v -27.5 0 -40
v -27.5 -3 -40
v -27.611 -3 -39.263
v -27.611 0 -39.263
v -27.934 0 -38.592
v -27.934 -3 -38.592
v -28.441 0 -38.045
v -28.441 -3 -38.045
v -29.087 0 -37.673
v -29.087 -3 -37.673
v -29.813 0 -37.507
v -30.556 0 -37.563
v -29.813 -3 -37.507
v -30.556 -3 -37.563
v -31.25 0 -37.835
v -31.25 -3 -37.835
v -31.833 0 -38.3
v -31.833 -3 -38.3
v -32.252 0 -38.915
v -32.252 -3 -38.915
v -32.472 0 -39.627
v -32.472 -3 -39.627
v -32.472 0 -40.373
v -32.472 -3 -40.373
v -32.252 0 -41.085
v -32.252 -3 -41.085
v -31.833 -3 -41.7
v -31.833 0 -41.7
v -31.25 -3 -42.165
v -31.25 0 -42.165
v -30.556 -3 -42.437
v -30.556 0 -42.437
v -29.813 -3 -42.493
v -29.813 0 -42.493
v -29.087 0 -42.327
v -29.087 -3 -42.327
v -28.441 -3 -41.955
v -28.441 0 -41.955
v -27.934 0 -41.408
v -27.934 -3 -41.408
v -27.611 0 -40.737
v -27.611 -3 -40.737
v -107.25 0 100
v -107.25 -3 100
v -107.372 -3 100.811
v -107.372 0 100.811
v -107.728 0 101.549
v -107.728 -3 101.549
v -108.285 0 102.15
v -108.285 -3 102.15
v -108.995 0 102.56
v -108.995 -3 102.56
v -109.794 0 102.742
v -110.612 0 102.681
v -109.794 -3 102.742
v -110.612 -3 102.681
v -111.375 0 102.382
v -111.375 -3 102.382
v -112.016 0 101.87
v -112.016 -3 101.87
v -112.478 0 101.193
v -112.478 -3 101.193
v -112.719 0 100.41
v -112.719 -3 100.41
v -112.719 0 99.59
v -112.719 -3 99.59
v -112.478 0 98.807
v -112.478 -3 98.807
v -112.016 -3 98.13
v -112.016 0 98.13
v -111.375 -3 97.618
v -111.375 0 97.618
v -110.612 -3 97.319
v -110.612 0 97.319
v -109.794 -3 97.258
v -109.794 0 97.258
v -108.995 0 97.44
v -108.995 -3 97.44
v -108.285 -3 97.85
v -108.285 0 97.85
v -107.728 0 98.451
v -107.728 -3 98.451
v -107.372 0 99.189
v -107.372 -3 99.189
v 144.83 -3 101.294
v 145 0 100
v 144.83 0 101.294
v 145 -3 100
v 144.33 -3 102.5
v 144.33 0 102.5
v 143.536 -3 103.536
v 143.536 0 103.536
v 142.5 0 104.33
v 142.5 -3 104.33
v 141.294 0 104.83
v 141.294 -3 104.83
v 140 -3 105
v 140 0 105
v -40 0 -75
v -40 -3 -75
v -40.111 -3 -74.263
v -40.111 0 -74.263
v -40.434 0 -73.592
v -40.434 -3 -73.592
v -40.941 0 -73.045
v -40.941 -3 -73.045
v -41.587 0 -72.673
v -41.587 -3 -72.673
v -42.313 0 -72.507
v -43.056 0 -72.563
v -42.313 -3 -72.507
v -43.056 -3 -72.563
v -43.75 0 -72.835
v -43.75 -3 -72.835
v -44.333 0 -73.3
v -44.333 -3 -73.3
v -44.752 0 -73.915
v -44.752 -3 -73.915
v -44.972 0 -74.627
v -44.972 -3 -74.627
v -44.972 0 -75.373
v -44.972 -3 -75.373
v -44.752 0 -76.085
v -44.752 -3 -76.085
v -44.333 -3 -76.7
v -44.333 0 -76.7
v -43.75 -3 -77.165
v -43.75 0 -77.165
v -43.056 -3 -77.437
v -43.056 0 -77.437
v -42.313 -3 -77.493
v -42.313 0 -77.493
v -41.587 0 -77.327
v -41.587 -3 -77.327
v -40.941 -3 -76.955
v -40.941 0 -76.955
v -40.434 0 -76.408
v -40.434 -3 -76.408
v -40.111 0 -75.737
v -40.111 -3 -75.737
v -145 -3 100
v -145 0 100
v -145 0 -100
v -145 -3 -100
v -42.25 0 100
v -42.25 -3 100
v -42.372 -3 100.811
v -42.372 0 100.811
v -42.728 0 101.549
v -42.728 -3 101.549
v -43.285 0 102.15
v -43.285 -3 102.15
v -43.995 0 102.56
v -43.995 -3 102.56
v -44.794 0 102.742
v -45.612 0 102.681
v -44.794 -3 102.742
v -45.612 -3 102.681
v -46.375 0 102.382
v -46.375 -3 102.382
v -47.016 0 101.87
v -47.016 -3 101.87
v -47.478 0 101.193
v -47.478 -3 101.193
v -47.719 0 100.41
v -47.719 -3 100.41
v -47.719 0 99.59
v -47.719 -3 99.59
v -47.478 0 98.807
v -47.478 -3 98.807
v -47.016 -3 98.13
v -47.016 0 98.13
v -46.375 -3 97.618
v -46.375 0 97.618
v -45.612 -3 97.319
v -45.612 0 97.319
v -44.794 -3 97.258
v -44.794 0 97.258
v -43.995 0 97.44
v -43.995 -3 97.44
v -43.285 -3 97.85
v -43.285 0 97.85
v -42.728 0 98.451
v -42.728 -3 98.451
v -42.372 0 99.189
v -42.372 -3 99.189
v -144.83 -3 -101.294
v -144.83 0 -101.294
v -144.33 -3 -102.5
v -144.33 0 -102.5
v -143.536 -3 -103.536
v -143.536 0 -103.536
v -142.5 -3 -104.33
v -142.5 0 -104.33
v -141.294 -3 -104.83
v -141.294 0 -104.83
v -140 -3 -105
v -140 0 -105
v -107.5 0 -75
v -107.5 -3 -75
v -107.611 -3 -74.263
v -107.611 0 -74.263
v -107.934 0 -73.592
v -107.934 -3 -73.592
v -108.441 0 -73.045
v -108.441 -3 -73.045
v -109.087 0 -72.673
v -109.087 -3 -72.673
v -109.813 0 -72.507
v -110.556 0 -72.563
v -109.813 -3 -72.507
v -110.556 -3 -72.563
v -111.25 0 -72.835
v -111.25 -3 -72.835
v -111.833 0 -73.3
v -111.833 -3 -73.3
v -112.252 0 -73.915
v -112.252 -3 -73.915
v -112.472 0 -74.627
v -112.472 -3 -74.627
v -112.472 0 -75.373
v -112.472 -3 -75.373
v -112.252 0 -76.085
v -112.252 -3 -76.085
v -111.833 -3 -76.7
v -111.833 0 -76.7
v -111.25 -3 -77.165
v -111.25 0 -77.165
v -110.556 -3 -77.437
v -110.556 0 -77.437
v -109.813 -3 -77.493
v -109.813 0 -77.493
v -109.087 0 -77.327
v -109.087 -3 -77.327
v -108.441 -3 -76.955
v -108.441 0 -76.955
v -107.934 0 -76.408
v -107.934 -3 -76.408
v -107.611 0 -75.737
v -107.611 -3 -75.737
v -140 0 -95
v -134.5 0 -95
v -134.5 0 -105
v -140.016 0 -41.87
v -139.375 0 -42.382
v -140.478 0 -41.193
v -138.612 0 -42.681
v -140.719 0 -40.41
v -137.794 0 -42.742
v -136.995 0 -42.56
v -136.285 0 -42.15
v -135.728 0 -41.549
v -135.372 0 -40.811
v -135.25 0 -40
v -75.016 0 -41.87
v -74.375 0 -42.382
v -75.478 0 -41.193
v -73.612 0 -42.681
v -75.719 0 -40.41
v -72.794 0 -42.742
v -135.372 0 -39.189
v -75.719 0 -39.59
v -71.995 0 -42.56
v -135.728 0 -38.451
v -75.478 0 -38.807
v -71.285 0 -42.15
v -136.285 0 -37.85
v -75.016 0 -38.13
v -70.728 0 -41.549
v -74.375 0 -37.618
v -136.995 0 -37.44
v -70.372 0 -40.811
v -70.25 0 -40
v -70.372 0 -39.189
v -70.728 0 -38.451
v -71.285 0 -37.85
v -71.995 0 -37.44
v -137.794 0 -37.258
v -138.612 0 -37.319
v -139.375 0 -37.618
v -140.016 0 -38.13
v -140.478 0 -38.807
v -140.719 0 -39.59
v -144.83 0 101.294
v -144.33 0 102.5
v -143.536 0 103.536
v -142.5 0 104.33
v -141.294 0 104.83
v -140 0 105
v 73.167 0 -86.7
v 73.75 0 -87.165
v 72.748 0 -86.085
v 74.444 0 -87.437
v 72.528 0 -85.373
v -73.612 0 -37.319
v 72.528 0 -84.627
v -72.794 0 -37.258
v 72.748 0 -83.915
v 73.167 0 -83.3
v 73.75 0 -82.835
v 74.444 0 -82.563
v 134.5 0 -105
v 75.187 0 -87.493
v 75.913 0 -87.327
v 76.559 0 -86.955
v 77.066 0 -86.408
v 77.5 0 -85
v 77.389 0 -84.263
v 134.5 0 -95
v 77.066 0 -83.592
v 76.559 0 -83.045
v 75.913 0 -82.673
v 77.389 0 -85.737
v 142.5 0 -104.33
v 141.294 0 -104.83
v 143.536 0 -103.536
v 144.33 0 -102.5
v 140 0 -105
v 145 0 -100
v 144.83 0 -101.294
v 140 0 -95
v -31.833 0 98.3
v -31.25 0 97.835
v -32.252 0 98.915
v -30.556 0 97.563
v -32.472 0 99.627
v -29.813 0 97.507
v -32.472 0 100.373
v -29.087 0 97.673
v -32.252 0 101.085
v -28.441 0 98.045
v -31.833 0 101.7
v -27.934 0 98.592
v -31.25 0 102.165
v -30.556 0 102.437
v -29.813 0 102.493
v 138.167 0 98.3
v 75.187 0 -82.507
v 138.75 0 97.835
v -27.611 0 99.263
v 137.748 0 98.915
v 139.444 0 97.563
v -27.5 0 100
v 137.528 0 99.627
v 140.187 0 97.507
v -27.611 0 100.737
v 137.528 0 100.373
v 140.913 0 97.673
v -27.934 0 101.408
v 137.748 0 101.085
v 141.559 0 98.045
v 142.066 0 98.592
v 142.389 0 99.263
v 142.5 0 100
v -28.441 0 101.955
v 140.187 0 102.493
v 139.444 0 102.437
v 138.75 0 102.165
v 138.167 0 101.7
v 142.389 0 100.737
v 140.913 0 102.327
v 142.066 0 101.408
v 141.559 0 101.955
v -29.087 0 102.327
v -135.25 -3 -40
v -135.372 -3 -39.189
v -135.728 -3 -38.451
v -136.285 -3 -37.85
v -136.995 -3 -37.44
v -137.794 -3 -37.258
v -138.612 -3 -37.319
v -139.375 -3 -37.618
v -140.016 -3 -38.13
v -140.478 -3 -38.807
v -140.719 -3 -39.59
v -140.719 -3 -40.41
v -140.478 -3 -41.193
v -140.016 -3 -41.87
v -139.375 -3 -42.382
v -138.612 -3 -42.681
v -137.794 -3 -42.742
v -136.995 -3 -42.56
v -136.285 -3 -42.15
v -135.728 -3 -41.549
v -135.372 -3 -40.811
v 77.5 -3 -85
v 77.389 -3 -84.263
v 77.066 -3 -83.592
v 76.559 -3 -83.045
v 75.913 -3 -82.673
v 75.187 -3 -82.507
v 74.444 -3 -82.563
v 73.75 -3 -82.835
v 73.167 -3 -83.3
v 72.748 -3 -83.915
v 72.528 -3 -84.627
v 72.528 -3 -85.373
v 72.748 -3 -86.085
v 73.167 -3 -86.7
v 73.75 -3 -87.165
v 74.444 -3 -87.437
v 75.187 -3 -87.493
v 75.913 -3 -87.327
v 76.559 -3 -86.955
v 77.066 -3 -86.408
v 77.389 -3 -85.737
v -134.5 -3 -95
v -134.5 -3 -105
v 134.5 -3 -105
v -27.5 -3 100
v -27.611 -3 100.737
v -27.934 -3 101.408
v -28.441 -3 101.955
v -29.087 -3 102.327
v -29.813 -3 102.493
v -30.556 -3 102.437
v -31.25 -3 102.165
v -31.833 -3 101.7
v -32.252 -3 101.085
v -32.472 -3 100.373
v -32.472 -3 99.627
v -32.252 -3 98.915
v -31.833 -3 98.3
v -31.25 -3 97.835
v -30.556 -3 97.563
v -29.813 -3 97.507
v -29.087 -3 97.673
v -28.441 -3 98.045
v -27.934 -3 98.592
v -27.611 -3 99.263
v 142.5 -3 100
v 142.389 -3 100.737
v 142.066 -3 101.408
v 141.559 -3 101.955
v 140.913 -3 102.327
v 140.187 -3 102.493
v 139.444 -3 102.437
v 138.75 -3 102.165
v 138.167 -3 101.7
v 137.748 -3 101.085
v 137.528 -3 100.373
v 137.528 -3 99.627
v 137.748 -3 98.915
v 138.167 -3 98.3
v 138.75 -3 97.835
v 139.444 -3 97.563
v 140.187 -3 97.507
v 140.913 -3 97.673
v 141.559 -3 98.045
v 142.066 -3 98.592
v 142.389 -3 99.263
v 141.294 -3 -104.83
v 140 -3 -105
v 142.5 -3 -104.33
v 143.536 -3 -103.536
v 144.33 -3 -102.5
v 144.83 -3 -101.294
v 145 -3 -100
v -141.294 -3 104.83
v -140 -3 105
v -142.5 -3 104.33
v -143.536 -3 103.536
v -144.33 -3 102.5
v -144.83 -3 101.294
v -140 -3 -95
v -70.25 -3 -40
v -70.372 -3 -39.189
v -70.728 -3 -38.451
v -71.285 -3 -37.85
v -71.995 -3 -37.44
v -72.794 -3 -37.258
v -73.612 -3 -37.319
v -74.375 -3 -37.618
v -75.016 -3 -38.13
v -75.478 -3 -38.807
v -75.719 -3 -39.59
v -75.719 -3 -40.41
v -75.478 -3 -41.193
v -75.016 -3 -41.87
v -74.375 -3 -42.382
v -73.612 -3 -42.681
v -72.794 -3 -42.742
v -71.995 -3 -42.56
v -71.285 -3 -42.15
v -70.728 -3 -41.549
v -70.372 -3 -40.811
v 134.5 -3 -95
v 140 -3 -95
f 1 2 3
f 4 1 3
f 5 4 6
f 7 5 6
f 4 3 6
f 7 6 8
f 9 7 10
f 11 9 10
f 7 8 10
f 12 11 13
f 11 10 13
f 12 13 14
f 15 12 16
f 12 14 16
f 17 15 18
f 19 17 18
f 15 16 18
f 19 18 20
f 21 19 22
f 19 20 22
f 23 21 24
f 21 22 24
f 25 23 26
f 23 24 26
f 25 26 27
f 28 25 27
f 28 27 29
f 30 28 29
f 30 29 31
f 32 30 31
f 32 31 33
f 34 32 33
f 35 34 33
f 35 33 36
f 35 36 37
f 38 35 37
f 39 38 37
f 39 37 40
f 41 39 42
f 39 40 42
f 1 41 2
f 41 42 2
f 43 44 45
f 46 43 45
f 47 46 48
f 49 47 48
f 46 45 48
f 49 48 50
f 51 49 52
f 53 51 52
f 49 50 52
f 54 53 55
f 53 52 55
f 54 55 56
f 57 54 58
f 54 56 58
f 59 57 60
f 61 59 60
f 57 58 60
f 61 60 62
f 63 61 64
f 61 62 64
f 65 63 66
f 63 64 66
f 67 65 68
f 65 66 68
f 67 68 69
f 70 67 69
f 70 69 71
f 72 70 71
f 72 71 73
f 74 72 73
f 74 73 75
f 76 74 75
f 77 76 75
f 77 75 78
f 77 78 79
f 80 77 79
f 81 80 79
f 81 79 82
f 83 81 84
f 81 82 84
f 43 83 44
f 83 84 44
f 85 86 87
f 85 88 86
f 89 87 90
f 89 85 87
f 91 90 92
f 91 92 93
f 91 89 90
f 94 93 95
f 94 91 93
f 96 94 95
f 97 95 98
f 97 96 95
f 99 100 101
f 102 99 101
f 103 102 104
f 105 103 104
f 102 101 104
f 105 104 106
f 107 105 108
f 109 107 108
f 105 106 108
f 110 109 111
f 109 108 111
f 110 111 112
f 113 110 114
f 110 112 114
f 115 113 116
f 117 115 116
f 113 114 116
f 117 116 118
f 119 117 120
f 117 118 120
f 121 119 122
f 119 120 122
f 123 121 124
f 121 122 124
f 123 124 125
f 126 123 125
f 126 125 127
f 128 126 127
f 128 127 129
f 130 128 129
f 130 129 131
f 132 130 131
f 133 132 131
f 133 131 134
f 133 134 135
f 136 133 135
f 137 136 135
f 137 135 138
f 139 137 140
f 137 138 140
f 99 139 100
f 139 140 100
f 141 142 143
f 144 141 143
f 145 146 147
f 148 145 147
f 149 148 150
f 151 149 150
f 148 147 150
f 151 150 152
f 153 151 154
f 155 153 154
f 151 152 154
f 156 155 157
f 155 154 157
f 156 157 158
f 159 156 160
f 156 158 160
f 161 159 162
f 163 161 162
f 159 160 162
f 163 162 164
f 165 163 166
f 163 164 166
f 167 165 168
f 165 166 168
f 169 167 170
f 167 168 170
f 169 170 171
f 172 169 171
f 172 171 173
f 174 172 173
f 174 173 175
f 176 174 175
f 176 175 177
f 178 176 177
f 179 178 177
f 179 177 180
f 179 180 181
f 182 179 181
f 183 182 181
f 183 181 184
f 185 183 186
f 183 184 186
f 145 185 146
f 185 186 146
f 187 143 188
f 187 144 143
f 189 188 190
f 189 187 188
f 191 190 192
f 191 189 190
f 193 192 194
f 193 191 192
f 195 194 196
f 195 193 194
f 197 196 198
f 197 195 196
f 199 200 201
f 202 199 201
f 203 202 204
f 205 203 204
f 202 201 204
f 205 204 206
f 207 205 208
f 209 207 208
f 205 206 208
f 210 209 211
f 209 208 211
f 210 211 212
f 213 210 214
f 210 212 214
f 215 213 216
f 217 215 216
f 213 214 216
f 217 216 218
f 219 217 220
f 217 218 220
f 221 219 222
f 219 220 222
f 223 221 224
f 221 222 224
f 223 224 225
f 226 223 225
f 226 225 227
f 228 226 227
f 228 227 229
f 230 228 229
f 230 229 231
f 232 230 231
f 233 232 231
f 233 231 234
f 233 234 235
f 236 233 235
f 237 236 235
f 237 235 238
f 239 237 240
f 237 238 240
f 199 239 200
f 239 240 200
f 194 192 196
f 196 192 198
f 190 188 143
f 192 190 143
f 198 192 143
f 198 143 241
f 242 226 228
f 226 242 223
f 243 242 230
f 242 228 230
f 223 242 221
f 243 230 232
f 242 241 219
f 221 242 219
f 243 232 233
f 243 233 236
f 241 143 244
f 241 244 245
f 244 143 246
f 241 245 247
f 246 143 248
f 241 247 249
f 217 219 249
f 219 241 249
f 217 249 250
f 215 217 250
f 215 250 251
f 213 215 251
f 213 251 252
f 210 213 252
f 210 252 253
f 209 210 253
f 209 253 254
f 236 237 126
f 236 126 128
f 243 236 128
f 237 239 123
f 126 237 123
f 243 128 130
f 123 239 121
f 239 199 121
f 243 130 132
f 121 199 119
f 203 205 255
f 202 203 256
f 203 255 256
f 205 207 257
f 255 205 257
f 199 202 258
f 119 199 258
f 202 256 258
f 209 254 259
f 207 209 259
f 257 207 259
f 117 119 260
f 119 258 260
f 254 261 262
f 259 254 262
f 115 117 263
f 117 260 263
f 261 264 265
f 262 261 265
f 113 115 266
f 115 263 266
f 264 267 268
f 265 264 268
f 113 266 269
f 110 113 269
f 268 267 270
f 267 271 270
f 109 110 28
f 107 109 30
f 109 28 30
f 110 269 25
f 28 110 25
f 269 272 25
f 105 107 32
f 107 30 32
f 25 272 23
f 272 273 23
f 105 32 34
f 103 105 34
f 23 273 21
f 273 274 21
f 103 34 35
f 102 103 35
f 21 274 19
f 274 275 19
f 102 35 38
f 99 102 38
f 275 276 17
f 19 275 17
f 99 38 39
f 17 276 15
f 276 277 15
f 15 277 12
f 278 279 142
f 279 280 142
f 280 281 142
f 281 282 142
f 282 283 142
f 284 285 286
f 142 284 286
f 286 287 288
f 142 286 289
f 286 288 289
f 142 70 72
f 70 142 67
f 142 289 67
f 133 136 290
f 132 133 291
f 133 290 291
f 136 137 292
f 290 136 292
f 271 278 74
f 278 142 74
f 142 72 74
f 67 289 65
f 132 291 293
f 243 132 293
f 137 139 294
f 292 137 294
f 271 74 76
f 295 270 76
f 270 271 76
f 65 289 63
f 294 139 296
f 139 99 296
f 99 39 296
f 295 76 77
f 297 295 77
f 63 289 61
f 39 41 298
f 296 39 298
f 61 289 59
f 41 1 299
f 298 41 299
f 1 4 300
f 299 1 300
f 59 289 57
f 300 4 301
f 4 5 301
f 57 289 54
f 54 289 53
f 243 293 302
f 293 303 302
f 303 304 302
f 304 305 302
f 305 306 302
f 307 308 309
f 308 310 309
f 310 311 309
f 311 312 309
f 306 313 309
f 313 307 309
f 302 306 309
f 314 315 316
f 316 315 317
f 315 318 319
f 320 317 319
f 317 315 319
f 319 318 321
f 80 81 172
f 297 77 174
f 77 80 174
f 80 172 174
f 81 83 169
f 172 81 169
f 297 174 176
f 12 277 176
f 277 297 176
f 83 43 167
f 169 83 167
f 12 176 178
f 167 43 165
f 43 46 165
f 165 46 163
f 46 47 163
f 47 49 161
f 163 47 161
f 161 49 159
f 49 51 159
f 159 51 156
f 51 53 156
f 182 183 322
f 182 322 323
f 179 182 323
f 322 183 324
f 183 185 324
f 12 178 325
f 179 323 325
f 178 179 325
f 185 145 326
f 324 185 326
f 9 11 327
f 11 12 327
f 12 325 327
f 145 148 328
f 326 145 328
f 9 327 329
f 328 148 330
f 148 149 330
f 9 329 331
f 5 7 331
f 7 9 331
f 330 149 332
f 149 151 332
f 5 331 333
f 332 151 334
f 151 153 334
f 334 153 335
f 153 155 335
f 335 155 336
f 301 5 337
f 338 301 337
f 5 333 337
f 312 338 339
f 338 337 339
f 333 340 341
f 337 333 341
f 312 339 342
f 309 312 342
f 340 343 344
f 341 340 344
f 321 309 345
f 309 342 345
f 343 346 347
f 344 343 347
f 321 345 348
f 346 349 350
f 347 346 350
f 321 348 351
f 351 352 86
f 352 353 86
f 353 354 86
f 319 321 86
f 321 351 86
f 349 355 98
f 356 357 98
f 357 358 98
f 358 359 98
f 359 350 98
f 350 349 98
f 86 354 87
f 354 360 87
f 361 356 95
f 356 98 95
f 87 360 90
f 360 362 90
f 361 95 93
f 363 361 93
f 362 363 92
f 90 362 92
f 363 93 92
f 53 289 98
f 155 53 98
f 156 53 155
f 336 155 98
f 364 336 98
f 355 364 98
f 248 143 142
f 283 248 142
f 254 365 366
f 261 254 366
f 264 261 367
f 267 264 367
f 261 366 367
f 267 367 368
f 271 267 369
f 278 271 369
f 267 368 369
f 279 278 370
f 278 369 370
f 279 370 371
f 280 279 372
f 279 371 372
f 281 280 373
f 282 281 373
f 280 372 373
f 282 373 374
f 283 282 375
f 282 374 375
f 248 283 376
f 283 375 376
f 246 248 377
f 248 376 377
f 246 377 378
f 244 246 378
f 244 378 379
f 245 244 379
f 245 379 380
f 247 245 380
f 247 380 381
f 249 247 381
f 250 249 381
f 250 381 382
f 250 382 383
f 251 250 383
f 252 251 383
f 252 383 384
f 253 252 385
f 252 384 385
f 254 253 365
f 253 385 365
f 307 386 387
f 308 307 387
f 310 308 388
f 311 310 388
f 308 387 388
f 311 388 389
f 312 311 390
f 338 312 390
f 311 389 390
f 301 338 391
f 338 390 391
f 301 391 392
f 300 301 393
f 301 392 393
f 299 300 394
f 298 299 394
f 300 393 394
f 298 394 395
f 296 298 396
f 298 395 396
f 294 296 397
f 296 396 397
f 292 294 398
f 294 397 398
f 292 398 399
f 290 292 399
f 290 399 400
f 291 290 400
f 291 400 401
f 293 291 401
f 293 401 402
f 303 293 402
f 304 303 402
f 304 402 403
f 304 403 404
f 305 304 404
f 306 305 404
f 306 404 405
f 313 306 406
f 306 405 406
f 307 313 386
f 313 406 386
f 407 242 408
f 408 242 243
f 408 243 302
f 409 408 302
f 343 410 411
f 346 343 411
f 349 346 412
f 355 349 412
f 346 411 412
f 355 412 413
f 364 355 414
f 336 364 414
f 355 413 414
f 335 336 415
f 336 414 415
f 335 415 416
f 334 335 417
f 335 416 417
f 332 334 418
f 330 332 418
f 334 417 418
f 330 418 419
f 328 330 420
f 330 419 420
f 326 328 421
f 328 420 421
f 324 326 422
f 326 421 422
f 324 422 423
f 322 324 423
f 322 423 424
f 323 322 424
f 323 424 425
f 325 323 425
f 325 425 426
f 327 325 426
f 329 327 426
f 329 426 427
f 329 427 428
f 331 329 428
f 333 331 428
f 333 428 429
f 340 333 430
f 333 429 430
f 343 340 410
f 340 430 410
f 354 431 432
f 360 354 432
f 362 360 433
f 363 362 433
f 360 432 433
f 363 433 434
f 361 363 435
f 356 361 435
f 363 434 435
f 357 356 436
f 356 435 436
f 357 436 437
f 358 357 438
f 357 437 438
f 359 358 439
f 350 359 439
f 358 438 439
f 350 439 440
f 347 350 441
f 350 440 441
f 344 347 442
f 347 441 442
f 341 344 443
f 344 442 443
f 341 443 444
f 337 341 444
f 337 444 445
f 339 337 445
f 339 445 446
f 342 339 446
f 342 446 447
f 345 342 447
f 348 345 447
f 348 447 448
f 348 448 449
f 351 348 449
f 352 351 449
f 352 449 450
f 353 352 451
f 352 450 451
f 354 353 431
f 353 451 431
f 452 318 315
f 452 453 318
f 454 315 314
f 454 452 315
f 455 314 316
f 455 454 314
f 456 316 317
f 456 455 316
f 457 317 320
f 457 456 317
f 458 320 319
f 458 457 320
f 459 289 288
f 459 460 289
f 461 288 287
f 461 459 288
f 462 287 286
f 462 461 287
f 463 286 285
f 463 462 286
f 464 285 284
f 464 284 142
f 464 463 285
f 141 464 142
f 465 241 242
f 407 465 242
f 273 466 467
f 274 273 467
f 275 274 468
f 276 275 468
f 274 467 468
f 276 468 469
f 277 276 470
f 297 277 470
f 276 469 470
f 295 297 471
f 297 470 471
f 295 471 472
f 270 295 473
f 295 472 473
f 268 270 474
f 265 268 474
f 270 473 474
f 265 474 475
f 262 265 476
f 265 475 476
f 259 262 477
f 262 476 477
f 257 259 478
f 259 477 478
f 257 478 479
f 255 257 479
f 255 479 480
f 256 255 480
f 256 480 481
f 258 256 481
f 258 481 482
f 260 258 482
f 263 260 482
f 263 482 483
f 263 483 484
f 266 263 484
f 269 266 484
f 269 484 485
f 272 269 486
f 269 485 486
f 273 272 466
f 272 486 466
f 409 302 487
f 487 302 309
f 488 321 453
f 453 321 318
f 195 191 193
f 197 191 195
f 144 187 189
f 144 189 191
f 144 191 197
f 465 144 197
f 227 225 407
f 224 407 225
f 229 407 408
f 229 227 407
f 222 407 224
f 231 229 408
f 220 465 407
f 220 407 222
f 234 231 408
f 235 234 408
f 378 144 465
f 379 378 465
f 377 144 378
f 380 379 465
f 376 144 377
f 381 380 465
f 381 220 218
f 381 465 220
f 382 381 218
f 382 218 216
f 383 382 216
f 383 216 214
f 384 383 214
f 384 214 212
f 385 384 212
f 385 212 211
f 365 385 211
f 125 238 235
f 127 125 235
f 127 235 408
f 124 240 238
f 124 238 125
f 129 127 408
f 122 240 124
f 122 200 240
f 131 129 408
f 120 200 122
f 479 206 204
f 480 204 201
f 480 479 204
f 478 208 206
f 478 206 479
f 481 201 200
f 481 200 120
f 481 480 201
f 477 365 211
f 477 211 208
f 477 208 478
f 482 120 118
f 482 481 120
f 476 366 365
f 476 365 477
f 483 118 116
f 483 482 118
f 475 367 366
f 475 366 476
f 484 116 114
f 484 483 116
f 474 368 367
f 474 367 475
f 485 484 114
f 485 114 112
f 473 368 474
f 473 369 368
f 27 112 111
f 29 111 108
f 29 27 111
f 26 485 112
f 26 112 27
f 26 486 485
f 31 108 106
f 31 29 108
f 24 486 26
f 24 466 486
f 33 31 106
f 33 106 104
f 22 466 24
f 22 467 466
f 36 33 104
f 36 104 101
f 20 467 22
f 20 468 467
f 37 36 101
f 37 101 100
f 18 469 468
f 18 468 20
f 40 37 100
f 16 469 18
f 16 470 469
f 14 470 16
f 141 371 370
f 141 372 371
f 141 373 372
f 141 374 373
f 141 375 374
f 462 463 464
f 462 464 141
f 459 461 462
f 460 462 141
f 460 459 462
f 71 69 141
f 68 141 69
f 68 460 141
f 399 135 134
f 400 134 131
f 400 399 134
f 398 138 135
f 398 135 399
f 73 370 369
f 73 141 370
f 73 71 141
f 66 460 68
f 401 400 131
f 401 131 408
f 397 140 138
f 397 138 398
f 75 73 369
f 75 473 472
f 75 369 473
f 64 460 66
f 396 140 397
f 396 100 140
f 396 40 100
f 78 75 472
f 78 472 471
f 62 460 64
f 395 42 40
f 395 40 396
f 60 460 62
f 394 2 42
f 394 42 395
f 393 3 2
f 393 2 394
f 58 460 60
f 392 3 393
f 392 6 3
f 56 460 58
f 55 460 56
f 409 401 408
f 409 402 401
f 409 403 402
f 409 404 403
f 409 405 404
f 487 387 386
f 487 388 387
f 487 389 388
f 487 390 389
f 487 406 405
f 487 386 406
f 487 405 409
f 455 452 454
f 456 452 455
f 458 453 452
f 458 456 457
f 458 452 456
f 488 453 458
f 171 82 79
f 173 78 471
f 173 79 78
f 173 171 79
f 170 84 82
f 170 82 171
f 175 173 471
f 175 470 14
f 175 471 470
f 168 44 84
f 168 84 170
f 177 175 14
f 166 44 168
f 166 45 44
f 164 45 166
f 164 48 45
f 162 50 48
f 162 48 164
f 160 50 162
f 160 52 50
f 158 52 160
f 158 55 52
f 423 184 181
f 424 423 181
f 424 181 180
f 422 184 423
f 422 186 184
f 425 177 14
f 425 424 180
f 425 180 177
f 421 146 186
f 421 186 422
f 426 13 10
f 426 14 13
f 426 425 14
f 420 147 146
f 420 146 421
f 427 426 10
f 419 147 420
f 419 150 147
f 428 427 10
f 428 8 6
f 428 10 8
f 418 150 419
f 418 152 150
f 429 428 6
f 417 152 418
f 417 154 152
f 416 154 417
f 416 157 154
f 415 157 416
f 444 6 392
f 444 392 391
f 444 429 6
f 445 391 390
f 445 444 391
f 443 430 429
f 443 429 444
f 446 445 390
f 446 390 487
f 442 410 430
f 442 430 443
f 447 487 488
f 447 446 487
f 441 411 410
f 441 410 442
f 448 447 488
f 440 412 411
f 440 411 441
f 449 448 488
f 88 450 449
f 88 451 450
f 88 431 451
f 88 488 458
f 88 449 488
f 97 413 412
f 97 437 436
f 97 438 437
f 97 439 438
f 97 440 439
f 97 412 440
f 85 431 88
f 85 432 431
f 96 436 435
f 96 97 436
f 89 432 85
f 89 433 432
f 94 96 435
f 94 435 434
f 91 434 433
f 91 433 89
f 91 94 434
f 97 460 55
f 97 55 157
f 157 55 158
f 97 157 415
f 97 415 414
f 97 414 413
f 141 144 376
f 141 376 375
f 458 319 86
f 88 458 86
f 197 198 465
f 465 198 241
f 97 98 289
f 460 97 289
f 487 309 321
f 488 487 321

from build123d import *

# Parameters (mm, degrees)
F1_DEPTH = 3
F2_R     = 2.75
F3_DEPTH = 3
F4_R     = 2.5
F5_DEPTH = 3
F6_R     = 2.5
F7_DEPTH = 3
F8_R     = 4.99999


# Not quite as in the source:
# - a fillet or chamfer is up to 0.001 mm smaller than in the source, because OpenCascade refuses the exact size


with BuildPart() as f1:
    # F0 (on Front) → F1 (new body)
    with BuildSketch(Plane.XZ):
        Polygon((140, -105), (145, -105), (145, 105), (-145, 105), (-145, -105), (-140, -105), (-140, -95), (-134.5, -95), (-134.5, -105), (134.5, -105), (134.5, -95), (140, -95), align=None)
    extrude(amount=F1_DEPTH)

    # F2 (on face) → F3 (cut, through all)
    with BuildSketch(Plane.XZ.offset(3)):
        with Locations((-110, 100)):
            Circle(F2_R)
        with Locations((-138, -40)):
            Circle(F2_R)
        with Locations((-45, 100)):
            Circle(F2_R)
        with Locations((-73, -40)):
            Circle(F2_R)
    extrude(amount=-F3_DEPTH, mode=Mode.SUBTRACT)

    # F4 (on face) → F5 (cut, through all)
    with BuildSketch(Plane.XZ.offset(3)):
        with Locations((-30, 100)):
            Circle(F4_R)
        with Locations((140, 100)):
            Circle(F4_R)
        with Locations((75, -85)):
            Circle(F4_R)
        with Locations((-30, -40)):
            Circle(F4_R)
    extrude(amount=-F5_DEPTH, mode=Mode.SUBTRACT)

    # F6 (on face) → F7 (cut, through all)
    with BuildSketch(Plane.XZ.offset(3)):
        with Locations((-110, -75)):
            Circle(F6_R)
        with Locations((-42.5, -75)):
            Circle(F6_R)
    extrude(amount=-F7_DEPTH, mode=Mode.SUBTRACT)

    # F8 (radius 5 in the source; OpenCascade refuses exactly that, so slightly less here)
    f8_edges = [f1.edges().sort_by_distance(p)[0] for p in [
        (-145, -1.5, 105),
        (145, -1.5, 105),
        (145, -1.5, -105),
        (-145, -1.5, -105),
    ]]
    fillet(f8_edges, radius=F8_R)


solid = f1.part
